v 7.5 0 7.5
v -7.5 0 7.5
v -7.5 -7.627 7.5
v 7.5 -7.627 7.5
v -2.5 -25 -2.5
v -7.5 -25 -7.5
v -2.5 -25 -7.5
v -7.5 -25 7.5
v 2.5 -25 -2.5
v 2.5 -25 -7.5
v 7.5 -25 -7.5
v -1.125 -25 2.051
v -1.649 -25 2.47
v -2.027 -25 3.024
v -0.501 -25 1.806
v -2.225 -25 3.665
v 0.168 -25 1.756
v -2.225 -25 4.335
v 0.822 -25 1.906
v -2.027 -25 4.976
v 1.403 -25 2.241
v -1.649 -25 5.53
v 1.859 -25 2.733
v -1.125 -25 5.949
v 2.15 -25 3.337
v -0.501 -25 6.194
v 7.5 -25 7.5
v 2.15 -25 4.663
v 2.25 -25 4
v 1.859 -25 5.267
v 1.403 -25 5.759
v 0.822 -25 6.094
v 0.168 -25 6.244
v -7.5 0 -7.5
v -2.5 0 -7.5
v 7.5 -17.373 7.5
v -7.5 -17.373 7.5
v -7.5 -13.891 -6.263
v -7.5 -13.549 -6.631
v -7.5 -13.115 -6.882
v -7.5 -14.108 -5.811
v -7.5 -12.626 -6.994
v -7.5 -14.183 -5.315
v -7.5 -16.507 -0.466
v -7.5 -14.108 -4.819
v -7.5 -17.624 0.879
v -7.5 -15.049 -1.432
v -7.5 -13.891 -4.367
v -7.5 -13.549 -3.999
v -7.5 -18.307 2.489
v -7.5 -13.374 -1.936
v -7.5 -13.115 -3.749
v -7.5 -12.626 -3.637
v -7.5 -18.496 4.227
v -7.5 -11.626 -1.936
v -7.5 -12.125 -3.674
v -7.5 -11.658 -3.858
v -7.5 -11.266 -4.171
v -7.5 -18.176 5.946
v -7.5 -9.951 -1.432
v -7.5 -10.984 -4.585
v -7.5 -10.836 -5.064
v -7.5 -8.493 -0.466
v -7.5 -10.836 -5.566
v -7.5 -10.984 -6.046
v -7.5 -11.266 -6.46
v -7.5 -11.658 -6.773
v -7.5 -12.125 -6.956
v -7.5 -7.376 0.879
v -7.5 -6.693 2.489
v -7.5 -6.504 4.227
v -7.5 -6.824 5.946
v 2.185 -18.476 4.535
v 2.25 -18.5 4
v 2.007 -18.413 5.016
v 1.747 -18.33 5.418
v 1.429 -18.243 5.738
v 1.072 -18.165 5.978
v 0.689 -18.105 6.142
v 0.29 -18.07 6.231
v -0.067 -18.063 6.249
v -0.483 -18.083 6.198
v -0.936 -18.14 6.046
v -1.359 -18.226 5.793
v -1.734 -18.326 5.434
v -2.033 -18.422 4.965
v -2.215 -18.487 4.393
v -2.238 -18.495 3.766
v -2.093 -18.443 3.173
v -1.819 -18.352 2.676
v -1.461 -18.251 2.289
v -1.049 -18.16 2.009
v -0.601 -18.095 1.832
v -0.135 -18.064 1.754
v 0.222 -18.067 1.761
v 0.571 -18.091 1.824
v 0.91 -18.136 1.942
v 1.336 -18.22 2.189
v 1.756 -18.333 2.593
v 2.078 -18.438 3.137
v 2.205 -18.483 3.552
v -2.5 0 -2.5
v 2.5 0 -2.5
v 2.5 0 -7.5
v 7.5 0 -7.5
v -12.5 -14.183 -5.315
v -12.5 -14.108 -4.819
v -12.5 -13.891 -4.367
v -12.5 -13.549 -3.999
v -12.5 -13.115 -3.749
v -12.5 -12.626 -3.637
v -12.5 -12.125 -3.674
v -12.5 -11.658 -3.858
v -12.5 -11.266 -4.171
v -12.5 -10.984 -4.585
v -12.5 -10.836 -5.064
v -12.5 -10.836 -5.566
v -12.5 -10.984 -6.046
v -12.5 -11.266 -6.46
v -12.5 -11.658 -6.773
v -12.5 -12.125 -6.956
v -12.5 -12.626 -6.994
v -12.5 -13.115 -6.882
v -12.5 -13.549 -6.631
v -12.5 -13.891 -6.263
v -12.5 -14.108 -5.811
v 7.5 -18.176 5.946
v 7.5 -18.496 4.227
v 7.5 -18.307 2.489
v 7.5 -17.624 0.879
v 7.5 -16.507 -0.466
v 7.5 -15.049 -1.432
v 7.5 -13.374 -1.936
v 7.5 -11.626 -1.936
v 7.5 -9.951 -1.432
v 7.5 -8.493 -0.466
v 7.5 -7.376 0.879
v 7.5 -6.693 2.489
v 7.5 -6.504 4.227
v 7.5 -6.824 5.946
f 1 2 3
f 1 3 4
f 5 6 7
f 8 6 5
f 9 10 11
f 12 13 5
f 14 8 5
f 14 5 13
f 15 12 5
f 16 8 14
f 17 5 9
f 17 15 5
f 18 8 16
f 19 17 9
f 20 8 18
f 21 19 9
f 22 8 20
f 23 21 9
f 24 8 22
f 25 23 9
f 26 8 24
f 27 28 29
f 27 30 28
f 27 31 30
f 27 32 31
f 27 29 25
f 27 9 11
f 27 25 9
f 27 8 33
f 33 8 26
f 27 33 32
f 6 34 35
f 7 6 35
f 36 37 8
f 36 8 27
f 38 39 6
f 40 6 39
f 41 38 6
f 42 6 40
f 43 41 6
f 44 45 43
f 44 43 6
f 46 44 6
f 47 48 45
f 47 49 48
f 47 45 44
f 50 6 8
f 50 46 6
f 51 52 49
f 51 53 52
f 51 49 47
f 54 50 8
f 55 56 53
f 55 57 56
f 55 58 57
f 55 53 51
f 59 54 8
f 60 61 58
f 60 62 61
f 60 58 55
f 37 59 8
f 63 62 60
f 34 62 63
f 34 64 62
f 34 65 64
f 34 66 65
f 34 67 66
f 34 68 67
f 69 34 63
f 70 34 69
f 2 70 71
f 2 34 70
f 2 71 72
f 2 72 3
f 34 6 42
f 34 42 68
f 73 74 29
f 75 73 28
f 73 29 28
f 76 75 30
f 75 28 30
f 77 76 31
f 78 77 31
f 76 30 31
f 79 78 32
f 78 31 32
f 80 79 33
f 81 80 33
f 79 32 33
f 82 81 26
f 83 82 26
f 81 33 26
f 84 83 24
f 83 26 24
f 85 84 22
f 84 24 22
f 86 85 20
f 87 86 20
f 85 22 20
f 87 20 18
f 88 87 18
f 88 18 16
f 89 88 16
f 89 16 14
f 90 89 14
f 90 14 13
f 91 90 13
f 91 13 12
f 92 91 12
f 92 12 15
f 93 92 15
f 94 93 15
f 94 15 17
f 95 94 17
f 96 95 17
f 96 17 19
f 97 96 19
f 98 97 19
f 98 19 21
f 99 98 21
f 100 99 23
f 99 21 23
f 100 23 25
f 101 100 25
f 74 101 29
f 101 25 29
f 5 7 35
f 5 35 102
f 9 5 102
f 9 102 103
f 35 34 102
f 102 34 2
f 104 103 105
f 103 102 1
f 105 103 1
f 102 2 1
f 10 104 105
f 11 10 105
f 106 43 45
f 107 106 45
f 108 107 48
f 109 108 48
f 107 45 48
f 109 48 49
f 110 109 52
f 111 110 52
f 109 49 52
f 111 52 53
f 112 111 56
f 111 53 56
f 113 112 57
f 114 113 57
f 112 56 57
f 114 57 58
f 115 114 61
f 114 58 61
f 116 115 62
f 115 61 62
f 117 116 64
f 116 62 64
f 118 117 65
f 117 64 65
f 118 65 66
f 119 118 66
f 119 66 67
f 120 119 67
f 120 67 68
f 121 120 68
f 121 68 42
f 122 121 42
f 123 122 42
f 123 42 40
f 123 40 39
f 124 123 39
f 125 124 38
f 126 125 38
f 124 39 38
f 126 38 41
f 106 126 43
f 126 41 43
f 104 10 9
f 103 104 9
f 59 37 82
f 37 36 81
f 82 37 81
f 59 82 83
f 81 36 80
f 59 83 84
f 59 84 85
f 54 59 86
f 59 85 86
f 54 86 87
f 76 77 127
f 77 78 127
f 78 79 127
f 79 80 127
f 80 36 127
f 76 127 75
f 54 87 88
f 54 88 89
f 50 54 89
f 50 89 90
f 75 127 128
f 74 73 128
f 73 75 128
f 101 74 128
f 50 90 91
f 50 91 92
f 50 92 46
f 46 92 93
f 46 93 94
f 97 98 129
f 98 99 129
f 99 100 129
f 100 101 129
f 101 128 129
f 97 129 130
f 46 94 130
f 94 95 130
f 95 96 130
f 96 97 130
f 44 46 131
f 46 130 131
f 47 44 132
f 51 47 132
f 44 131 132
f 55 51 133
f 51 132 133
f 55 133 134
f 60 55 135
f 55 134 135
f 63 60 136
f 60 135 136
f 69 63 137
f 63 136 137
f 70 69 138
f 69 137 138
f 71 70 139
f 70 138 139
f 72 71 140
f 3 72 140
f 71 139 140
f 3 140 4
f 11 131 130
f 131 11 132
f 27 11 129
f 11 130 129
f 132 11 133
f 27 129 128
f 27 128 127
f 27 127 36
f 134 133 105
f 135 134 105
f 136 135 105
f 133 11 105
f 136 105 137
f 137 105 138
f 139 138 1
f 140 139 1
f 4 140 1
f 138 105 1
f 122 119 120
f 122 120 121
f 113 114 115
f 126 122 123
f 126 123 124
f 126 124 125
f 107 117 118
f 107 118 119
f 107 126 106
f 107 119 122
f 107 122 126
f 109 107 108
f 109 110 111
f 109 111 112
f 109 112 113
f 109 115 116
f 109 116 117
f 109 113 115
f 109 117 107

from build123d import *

# Parameters (mm, degrees)
F0_W     = 15
F0_H     = 15
F1_DEPTH = 25
F2_W     = 5
F2_H     = 5
F3_DEPTH = 25
F5_D     = 12
F6_R     = 1.6830383024
F7_DEPTH = 5
F8_R     = 2.25
F9_DEPTH = 6.9388512347


with BuildPart() as f1:
    # F0 (on Front) → F1 (new body)
    with BuildSketch(Plane.XZ):
        Rectangle(F0_W, F0_H)
    extrude(amount=F1_DEPTH)

    # F2 (on face) → F3 (cut)
    with BuildSketch(Plane.XZ.offset(25)):
        with Locations((0, -5)):
            Rectangle(F2_W, F2_H)
    extrude(amount=-F3_DEPTH, mode=Mode.SUBTRACT)

    # F5 (through all)
    with Locations(Plane(origin=(-7.5, 0, 0), x_dir=(0, -1, 0), z_dir=(-1, 0, 0))):
        with Locations((12.5, 4)):
            Hole(F5_D / 2)

    # F6 (on face) → F7 (join)
    with BuildSketch(Plane(origin=(-7.5, 0, 0), x_dir=(0, -1, 0), z_dir=(-1, 0, 0))):
        with Locations((12.5, -5.3153163753)):
            Circle(F6_R)
    extrude(amount=F7_DEPTH)

    # F8 (on face) → F9 (cut, through all)
    with BuildSketch(Plane.XZ.offset(25)):
        with Locations((0, 4)):
            Circle(F8_R)
    extrude(amount=-F9_DEPTH, mode=Mode.SUBTRACT)


solid = f1.part
